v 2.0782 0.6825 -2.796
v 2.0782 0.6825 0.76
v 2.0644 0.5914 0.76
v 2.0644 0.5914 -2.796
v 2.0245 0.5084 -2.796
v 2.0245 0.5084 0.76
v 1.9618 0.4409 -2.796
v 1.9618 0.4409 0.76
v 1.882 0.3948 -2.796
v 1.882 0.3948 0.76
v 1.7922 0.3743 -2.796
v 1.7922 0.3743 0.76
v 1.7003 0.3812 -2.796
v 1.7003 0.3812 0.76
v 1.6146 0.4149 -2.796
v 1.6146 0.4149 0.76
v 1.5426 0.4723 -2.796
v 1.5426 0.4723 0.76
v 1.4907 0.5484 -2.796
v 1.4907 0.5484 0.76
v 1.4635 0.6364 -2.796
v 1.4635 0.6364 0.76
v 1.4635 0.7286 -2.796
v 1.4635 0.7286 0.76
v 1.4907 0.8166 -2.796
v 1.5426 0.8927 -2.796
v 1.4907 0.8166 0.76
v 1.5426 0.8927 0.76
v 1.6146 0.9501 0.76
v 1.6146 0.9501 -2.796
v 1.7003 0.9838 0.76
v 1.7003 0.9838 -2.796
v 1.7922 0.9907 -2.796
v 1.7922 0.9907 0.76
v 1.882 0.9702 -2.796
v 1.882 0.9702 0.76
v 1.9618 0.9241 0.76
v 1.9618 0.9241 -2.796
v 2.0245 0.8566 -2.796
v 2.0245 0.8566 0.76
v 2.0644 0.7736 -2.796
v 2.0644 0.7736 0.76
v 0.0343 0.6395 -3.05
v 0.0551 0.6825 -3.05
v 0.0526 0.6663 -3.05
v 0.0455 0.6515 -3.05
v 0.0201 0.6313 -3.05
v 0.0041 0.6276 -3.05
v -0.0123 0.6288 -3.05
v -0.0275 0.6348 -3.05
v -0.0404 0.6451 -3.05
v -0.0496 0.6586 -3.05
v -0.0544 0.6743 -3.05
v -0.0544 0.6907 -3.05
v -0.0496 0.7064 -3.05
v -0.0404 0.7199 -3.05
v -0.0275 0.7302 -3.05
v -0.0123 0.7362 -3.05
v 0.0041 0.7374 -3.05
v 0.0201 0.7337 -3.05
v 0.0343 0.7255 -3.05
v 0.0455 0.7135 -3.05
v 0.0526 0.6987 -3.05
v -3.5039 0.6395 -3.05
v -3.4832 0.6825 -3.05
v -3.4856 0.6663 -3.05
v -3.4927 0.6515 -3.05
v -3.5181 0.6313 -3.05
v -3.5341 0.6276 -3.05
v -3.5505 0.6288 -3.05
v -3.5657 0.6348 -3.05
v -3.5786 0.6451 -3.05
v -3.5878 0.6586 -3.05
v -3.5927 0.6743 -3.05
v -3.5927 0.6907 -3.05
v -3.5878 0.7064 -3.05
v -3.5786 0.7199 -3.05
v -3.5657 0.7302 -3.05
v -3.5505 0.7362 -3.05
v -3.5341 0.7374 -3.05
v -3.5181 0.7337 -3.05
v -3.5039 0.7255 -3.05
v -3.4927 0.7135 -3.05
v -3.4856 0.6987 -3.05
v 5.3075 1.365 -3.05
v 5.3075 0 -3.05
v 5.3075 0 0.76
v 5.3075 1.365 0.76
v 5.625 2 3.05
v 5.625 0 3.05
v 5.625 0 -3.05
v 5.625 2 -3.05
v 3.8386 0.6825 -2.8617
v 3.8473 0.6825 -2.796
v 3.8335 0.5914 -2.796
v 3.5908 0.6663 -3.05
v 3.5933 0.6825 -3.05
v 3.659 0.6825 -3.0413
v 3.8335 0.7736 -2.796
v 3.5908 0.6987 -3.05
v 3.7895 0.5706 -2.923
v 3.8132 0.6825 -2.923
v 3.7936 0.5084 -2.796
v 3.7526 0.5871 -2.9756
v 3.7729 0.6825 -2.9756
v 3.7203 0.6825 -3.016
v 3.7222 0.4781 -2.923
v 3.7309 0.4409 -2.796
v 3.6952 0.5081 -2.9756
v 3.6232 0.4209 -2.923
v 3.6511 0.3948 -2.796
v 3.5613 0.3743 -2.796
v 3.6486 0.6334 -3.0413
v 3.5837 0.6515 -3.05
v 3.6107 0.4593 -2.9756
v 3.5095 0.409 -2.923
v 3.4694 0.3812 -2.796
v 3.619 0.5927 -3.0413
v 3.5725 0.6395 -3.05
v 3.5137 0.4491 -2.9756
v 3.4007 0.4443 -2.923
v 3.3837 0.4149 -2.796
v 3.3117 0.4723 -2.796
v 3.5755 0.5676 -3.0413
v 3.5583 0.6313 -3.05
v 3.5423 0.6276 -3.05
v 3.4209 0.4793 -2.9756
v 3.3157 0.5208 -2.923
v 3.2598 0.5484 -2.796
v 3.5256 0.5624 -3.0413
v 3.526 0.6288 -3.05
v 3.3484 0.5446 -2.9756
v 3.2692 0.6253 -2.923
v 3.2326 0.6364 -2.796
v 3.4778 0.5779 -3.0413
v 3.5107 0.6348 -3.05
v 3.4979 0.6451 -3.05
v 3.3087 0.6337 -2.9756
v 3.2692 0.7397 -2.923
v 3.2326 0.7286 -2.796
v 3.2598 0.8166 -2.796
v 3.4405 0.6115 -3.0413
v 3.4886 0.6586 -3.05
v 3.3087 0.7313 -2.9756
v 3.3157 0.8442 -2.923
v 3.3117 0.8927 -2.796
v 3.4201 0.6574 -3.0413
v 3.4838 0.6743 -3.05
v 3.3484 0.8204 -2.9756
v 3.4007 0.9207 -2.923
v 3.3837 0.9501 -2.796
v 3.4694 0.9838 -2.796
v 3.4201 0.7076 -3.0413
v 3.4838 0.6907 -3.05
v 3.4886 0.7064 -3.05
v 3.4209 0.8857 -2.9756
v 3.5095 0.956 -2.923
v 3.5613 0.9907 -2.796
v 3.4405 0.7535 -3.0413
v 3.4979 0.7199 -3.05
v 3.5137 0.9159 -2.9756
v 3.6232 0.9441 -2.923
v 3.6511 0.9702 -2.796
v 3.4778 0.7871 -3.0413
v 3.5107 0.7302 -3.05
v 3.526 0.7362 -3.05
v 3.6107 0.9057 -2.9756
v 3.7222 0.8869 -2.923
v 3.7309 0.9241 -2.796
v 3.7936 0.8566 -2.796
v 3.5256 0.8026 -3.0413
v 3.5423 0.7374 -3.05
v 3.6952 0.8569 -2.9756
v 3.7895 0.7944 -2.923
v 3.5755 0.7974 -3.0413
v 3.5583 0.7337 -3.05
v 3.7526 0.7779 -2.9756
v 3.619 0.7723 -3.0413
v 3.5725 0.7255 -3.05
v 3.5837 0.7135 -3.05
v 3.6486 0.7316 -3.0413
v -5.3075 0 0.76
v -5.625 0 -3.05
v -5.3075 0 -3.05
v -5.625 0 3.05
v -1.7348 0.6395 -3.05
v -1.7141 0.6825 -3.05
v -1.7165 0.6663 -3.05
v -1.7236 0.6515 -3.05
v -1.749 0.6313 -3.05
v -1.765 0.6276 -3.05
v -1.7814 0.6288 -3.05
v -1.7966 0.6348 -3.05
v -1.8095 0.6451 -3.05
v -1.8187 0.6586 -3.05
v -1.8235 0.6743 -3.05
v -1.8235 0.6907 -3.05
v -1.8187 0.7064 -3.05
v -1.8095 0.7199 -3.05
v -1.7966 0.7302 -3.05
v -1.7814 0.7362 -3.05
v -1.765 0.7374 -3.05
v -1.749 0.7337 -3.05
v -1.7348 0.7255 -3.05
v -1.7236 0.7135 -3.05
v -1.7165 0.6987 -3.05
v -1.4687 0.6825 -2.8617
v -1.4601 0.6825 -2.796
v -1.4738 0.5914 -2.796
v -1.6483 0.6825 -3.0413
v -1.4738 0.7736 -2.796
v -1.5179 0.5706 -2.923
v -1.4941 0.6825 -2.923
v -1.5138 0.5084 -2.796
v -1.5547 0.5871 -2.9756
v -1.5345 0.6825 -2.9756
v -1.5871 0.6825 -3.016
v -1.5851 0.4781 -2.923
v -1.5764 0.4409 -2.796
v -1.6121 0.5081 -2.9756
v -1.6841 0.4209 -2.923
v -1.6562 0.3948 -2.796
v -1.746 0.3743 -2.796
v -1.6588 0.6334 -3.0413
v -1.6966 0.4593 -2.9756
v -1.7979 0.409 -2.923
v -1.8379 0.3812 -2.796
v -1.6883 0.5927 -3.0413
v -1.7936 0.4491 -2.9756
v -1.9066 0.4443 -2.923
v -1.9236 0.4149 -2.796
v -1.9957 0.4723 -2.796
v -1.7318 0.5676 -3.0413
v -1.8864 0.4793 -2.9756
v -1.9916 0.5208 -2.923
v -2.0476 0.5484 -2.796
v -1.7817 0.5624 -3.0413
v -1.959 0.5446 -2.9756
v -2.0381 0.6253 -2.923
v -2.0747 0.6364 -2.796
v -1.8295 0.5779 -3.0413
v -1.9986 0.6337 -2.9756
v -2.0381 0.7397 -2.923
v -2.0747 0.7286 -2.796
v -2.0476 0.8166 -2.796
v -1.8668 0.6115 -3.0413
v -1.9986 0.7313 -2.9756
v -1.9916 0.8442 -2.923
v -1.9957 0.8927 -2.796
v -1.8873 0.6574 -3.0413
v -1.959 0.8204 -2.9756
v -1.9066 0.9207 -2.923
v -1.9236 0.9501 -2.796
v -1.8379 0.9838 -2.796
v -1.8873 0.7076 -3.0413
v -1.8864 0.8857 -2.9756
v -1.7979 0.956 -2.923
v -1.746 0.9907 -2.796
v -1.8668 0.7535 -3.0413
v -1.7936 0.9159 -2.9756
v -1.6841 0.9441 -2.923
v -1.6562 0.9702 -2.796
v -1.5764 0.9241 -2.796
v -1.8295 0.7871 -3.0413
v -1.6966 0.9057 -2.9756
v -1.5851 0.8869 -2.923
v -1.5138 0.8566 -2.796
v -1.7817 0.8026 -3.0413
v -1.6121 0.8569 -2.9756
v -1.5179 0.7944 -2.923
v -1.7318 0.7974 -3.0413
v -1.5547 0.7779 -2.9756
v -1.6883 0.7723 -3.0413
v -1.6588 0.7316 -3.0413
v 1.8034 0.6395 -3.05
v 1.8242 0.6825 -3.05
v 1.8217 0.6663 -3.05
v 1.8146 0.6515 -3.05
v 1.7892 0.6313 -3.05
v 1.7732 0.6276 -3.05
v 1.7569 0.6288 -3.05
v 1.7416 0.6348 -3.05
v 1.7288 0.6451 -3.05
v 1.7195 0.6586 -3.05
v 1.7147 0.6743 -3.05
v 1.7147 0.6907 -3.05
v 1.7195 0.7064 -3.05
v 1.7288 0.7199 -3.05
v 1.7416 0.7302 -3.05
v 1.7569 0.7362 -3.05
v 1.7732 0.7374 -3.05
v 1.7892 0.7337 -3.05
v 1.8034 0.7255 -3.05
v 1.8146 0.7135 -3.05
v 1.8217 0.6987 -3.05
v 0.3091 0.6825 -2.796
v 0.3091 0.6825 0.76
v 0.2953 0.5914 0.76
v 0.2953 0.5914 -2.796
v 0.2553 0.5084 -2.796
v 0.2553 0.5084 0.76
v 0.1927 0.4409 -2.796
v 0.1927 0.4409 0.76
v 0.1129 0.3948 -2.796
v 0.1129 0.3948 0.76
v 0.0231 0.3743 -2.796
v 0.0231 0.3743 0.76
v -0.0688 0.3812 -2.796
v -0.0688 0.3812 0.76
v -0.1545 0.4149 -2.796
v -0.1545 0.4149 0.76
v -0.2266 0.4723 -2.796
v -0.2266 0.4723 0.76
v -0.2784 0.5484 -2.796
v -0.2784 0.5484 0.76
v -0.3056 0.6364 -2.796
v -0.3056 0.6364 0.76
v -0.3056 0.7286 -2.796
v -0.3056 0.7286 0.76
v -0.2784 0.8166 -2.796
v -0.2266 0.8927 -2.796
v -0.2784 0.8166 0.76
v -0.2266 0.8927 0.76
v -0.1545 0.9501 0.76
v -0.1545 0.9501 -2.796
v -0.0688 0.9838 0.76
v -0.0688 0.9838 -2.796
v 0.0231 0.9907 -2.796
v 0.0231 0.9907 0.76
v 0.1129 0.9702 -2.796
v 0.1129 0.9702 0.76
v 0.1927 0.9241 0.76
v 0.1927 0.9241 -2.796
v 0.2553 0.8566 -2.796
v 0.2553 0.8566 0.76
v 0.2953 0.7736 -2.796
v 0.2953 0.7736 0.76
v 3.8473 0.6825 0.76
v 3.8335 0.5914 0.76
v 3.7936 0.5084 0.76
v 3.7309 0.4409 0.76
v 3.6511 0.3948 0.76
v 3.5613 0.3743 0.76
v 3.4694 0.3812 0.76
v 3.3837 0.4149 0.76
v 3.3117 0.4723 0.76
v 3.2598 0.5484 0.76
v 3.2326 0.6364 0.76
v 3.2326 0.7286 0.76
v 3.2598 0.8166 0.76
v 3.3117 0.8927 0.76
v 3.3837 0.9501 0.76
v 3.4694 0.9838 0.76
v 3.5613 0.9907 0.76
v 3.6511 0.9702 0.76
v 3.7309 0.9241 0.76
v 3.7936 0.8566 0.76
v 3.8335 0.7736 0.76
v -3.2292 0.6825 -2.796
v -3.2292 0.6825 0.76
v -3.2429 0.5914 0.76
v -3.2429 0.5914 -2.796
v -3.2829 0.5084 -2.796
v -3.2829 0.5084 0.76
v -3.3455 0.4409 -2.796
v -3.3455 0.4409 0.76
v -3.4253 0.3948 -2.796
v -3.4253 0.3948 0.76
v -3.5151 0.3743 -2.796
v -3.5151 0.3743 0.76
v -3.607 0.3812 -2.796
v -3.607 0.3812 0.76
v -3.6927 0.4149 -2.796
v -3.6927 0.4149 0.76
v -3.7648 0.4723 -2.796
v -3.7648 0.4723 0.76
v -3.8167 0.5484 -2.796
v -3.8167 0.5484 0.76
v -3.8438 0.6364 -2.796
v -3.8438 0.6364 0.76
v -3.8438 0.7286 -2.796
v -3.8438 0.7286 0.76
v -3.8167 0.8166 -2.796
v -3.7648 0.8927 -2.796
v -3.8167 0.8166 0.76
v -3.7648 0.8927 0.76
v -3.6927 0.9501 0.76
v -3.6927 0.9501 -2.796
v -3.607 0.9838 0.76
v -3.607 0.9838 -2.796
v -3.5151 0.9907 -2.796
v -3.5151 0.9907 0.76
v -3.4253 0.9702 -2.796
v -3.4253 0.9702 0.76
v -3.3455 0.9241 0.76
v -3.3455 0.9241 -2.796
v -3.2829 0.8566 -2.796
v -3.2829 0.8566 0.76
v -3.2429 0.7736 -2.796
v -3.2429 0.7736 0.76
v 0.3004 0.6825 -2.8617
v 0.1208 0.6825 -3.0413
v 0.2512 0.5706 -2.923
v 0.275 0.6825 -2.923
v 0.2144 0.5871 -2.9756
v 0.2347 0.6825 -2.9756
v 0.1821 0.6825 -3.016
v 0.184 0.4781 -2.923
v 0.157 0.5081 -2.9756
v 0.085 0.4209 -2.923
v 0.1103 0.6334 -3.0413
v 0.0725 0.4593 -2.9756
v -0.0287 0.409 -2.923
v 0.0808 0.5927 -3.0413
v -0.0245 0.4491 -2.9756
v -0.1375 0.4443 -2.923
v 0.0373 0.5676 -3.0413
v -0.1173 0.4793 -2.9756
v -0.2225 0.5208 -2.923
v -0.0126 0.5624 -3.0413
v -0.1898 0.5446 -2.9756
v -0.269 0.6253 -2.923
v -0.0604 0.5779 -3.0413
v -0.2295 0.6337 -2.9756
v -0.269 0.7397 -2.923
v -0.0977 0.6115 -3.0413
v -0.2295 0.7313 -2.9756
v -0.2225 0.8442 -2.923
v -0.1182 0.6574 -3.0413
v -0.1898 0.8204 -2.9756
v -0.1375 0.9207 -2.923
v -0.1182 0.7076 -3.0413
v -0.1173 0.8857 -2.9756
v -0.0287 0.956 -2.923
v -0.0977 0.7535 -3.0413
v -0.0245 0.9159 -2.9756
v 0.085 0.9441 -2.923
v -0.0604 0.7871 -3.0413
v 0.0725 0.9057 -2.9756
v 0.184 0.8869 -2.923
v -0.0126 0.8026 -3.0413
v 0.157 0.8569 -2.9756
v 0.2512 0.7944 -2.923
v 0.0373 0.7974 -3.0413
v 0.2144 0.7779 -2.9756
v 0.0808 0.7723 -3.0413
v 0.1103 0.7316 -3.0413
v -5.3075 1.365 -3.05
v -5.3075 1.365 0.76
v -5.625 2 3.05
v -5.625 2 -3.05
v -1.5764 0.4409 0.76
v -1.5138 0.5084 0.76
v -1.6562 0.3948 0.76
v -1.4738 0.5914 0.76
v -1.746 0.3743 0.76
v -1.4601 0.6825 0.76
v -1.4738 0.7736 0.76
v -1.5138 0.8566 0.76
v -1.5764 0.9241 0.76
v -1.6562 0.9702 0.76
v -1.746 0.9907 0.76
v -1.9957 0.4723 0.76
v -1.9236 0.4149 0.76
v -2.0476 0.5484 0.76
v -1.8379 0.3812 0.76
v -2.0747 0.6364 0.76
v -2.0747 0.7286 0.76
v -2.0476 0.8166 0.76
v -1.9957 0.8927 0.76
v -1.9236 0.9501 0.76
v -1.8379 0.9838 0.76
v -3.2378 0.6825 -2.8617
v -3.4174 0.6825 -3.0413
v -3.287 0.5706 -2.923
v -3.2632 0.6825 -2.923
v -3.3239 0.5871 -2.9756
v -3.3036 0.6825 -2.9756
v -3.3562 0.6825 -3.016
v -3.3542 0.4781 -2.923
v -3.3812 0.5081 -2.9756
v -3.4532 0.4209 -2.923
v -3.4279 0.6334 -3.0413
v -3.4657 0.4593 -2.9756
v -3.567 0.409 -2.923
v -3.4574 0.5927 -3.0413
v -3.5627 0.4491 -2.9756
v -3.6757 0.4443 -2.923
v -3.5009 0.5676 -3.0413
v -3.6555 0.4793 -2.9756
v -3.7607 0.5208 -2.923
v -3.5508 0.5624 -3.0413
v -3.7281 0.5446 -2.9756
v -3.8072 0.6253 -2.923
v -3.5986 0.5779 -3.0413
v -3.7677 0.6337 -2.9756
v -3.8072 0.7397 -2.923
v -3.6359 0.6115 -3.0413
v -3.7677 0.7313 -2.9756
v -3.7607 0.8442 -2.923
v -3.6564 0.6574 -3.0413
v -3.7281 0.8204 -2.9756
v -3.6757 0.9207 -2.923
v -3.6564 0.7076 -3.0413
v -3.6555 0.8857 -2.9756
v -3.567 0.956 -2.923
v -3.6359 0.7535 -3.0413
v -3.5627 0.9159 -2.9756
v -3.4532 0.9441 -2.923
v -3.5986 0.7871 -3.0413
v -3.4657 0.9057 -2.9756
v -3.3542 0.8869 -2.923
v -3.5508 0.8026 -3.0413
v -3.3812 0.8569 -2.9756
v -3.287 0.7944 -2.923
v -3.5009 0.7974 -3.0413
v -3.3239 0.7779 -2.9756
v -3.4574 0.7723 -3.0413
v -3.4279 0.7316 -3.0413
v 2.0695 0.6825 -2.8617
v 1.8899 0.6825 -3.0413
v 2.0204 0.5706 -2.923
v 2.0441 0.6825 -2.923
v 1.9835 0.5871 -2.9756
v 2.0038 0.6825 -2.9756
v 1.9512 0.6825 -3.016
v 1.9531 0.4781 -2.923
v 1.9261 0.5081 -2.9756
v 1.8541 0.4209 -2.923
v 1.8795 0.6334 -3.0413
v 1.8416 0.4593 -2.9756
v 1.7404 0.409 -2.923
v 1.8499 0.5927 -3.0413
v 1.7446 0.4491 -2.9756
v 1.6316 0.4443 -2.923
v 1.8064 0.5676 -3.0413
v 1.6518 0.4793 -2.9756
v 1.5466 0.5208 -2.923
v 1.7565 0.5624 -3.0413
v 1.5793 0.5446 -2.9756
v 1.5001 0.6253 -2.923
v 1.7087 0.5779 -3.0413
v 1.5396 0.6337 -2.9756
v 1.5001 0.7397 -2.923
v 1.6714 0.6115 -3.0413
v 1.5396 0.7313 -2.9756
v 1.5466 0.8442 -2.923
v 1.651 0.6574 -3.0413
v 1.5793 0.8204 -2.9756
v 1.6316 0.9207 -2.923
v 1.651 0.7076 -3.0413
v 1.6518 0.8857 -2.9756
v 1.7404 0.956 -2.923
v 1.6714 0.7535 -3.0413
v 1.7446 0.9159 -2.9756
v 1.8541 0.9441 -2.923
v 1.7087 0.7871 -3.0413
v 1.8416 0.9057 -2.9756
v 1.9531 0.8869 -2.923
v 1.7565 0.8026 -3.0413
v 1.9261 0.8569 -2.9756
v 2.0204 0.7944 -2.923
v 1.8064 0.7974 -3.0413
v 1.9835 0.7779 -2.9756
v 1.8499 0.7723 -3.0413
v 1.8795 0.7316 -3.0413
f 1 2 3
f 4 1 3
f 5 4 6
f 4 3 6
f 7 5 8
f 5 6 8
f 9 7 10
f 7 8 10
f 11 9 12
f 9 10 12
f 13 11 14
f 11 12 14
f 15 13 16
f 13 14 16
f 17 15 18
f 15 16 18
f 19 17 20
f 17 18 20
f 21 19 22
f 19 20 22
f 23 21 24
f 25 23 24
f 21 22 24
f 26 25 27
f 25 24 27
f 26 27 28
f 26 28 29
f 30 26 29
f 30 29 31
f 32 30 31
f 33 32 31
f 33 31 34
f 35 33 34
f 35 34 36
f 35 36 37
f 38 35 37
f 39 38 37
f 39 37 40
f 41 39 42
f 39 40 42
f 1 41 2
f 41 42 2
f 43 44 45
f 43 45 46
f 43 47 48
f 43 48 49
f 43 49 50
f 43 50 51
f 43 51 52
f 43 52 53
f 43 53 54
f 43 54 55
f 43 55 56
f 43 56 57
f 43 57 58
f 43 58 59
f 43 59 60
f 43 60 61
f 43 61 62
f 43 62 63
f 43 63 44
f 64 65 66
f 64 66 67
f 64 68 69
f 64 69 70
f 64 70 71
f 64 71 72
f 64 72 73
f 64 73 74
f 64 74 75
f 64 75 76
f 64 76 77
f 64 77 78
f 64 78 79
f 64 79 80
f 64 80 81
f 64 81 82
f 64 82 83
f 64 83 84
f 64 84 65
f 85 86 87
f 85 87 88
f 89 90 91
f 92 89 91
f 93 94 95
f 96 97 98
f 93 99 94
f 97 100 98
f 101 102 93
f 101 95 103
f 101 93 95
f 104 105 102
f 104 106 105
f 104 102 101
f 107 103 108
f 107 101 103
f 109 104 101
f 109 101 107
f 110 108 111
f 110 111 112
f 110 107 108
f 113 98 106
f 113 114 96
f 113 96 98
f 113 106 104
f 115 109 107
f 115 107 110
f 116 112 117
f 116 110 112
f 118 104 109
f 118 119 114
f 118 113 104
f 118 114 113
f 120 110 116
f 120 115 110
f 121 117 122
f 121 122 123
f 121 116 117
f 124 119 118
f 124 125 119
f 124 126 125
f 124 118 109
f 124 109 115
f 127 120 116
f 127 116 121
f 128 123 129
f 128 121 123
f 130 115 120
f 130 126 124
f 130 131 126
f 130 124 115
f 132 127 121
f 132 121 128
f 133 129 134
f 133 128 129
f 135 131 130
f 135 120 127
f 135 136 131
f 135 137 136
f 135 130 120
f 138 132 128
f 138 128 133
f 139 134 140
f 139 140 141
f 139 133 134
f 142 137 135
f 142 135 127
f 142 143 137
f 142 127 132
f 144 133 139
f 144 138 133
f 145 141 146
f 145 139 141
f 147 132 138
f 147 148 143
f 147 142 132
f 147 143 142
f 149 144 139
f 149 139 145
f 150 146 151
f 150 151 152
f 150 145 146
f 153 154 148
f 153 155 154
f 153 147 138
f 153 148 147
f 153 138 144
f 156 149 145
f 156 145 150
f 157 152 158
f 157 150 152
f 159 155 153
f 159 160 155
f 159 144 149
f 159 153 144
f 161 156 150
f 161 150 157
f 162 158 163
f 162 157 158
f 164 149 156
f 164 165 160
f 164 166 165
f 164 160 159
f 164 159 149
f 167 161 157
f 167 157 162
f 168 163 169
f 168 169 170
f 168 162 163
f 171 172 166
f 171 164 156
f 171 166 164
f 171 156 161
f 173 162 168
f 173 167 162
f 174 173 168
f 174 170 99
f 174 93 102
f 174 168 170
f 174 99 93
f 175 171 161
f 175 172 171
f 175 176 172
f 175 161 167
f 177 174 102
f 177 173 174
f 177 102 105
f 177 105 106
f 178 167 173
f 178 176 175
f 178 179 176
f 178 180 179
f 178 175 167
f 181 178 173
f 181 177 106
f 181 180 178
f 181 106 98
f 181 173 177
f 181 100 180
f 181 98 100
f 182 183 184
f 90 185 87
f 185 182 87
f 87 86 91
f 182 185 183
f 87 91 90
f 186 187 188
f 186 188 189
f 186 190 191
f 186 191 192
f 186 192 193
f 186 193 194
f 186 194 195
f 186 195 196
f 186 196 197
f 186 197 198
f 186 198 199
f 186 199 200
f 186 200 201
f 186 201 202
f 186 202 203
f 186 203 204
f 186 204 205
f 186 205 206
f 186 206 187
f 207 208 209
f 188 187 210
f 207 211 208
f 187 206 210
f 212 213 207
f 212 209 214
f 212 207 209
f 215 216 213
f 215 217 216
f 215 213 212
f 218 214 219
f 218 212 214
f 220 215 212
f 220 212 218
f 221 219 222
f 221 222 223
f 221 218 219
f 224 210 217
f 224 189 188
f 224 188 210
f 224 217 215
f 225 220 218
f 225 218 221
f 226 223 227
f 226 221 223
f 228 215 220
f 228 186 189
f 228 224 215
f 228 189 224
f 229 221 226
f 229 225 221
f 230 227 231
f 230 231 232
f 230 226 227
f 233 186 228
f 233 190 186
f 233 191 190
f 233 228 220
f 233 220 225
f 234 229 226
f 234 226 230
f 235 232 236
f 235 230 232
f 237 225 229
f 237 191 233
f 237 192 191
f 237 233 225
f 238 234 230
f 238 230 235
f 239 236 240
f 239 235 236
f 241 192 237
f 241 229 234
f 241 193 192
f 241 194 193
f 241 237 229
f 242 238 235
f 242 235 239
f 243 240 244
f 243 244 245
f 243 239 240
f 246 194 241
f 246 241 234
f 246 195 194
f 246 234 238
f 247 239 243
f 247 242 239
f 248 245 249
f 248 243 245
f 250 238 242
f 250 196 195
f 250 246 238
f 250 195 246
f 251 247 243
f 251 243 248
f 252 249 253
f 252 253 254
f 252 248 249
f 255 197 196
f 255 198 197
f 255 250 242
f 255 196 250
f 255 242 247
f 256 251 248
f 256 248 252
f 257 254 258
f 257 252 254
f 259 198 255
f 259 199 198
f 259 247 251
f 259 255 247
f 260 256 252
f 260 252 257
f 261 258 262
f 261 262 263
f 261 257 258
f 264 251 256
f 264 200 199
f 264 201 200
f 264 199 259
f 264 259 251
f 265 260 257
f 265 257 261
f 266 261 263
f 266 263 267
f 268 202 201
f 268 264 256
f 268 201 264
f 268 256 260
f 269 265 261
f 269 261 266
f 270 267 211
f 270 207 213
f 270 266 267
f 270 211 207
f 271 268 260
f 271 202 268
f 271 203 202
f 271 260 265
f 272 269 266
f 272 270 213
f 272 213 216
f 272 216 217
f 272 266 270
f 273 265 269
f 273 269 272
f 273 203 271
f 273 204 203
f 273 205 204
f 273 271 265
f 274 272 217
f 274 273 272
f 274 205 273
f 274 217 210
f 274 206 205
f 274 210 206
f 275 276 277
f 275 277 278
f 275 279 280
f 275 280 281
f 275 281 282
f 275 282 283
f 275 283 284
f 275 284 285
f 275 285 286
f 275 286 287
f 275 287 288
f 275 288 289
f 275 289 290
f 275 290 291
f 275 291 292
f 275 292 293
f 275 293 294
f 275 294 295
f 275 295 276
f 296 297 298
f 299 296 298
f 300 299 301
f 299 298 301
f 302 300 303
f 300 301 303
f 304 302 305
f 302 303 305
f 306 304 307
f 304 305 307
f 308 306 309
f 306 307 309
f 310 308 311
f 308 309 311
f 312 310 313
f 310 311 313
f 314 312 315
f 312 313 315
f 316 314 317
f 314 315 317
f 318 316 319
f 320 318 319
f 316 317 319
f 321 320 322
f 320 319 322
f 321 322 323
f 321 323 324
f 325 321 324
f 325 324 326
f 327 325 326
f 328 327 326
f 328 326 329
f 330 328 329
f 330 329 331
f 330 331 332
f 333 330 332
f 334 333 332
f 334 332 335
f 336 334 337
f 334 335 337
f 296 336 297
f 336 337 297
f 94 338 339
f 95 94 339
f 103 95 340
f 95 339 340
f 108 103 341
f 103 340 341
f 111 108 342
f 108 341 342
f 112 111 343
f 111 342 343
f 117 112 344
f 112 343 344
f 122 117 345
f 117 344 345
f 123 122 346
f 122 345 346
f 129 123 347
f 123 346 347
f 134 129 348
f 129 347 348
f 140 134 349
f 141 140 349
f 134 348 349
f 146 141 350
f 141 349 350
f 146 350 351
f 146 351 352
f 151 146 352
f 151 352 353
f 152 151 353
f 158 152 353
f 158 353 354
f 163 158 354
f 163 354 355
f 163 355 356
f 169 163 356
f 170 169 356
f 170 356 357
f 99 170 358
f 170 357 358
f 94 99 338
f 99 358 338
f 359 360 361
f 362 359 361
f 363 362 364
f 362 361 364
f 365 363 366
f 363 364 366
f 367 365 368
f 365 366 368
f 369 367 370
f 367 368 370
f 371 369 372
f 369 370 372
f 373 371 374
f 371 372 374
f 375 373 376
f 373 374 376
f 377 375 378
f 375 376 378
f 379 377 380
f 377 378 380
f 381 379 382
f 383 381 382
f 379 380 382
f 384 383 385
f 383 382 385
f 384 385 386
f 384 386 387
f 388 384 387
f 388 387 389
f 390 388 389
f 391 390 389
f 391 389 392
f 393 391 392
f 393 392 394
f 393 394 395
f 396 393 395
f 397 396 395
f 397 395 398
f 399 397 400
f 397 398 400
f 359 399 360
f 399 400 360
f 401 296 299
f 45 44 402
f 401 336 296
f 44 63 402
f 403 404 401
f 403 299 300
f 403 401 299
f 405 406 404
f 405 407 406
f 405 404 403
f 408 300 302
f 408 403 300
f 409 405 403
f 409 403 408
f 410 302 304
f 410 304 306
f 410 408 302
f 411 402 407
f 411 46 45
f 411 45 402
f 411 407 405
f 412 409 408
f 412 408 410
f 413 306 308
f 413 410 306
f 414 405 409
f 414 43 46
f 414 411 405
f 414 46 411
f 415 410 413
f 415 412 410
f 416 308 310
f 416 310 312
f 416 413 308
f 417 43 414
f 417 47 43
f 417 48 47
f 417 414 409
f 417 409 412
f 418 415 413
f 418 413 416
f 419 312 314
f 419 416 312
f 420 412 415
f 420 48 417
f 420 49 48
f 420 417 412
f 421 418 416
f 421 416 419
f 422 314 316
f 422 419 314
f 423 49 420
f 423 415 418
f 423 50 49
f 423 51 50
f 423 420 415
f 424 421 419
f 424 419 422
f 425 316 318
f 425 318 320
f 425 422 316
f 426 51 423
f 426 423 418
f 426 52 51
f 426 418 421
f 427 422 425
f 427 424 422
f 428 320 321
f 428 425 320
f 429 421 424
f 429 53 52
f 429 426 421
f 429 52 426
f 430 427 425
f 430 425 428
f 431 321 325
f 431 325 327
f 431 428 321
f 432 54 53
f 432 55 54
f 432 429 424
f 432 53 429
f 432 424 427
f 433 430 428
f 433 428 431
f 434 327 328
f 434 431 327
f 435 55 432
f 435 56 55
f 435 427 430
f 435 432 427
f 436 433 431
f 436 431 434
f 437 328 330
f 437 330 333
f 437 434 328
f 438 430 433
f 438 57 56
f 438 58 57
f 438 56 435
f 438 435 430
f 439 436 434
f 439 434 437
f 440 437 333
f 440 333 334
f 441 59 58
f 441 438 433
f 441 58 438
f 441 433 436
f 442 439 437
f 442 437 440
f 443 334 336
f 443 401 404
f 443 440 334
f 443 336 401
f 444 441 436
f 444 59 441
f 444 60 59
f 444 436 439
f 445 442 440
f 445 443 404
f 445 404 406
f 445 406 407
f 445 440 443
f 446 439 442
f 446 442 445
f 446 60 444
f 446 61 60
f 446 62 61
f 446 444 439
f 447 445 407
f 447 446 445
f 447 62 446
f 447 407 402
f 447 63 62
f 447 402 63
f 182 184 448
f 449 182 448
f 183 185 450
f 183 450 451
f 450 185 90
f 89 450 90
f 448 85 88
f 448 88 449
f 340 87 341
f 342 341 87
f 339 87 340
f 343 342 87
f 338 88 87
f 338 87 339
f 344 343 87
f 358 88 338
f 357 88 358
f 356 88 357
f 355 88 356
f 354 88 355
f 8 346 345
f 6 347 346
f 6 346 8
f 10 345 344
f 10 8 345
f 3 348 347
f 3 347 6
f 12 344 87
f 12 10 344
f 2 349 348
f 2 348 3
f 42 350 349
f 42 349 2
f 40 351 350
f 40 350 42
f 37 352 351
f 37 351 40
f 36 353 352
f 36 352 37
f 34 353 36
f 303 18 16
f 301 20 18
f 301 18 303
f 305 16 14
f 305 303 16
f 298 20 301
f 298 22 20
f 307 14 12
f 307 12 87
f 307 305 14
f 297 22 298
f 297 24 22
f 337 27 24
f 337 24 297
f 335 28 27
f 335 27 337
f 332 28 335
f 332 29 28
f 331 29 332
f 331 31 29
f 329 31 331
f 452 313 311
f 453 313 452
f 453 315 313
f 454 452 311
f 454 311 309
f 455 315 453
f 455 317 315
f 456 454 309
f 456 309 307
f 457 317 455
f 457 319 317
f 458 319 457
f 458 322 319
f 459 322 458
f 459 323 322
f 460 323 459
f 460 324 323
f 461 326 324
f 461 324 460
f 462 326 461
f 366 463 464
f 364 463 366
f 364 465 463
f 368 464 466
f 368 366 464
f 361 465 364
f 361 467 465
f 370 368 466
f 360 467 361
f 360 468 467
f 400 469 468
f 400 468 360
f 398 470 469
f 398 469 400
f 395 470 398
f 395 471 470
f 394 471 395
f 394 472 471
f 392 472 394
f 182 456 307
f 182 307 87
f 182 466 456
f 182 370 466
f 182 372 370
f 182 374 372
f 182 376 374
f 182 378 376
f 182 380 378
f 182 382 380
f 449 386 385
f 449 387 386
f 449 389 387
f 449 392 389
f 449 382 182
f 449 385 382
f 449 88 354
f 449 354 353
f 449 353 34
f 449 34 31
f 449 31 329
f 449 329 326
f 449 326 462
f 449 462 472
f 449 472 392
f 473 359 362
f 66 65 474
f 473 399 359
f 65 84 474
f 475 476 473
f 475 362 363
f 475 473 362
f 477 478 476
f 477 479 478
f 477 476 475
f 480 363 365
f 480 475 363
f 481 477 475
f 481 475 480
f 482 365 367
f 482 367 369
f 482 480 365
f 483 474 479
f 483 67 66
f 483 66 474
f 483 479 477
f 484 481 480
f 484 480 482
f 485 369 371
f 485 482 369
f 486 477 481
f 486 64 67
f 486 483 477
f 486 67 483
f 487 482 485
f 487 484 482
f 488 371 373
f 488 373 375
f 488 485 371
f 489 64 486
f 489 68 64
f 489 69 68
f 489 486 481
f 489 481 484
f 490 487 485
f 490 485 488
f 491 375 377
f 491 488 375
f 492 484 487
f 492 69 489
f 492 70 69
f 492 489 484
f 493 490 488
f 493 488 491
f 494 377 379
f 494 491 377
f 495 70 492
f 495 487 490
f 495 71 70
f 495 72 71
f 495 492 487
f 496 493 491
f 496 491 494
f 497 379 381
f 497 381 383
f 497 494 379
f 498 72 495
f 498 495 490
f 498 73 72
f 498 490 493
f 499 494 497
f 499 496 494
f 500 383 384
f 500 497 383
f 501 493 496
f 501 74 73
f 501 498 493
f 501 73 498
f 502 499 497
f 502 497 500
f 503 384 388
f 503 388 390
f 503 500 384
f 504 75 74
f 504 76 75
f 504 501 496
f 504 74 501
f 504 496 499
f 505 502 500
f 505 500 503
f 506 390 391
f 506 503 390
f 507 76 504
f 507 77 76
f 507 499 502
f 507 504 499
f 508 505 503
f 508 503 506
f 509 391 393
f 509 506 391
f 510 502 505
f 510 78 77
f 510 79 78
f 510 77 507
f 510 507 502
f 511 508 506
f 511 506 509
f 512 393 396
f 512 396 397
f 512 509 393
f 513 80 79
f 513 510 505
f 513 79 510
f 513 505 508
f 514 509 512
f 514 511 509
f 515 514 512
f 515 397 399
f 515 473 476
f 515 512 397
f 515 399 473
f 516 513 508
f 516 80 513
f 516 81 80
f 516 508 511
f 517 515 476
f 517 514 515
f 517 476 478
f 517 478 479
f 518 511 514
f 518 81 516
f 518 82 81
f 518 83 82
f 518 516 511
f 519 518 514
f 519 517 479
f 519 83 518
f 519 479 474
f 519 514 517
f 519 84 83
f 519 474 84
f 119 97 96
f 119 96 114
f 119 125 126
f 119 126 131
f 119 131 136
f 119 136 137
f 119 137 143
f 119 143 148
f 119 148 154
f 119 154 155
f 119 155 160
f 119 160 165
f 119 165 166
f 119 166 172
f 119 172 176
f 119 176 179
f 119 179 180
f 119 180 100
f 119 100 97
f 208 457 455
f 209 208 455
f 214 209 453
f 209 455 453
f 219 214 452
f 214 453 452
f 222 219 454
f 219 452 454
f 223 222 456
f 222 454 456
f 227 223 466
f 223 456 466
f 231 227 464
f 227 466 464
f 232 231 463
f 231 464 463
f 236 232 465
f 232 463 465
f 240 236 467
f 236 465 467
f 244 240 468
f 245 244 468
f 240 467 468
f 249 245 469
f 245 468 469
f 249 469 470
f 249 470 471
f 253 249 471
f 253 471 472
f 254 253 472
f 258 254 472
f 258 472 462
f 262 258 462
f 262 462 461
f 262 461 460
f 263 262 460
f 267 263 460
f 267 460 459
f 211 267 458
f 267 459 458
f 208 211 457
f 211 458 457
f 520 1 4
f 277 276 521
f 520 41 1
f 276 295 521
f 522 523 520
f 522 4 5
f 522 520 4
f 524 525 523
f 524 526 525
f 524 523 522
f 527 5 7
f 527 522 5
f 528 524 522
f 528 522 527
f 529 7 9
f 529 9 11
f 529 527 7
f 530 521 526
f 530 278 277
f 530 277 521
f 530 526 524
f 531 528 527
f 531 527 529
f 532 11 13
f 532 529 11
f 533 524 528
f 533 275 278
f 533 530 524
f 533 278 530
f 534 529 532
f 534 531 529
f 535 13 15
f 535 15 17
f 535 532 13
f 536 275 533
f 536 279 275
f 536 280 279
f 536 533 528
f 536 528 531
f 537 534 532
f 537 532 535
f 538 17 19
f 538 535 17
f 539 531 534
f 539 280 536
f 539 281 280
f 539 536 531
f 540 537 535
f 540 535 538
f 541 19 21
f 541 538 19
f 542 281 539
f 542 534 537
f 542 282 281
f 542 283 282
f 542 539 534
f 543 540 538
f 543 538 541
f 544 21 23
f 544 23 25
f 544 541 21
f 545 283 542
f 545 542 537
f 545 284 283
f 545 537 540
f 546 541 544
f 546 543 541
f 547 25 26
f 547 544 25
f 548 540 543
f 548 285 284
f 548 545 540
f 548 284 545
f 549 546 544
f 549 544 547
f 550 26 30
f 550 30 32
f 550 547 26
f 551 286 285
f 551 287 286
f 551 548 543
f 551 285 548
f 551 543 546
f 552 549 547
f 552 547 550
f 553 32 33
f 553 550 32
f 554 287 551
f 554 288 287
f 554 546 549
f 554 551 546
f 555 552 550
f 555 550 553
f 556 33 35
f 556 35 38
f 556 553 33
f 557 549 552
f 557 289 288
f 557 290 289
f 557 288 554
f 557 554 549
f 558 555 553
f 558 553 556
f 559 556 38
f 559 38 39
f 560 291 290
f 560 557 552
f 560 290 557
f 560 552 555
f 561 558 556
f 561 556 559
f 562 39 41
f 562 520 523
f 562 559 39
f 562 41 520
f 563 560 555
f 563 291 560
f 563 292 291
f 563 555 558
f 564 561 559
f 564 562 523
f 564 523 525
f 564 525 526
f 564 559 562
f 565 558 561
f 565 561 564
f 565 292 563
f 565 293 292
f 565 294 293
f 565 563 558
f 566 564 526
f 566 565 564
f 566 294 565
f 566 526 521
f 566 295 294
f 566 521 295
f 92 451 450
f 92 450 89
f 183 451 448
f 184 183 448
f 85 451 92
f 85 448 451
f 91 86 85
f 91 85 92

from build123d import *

# Parameters (mm, degrees)
SKETCH1_W           = 11.25
SKETCH1_H           = 6.1
BOSS_EXTRUDE1_DEPTH = 2
SKETCH2_W           = 10.615
SKETCH2_H           = 2.73
CUT_EXTRUDE1_DEPTH  = 3.81
SKETCH4_R           = 0.309051048
BOSS_EXTRUDE2_DEPTH = 3.81
FILLET1_R           = 0.254


with BuildPart() as part:
    # Sketch1 → Boss-Extrude1 (new body)
    with BuildSketch(Plane(origin=(0, 0, 0), x_dir=(1, 0, 0), z_dir=(0, 1, 0))):
        Rectangle(SKETCH1_W, SKETCH1_H)
    extrude(amount=BOSS_EXTRUDE1_DEPTH)

    # Sketch2 → Cut-Extrude1 (cut)
    with BuildSketch(Plane(origin=(0, 0, -3.05), x_dir=(-1, 0, 0), z_dir=(0, 0, -1))):
        Rectangle(SKETCH2_W, SKETCH2_H)
    extrude(amount=-CUT_EXTRUDE1_DEPTH, mode=Mode.SUBTRACT)

    # Sketch4 → Boss-Extrude2 (add)
    with BuildSketch(Plane(origin=(0, 0, 0.76), x_dir=(-1, 0, 0), z_dir=(0, 0, -1))):
        with Locations(Location((-3.53822, 0.6825, 0), (0, 0, 180))):
            Circle(SKETCH4_R)
        with Locations(Location((-1.76911, 0.6825, 0), (0, 0, 180))):
            Circle(SKETCH4_R)
        with Locations(Location((0, 0.6825, 0), (0, 0, 180))):
            Circle(SKETCH4_R)
        with Locations(Location((1.76911, 0.6825, 0), (0, 0, 180))):
            Circle(SKETCH4_R)
        with Locations(Location((3.53822, 0.6825, 0), (0, 0, 180))):
            Circle(SKETCH4_R)
    extrude(amount=BOSS_EXTRUDE2_DEPTH)

    # Fillet1
    fillet1_edges = [part.edges().sort_by_distance(p)[0] for p in [
        (3.229168952, 0.6825, -3.05),
        (1.460058952, 0.6825, -3.05),
        (-0.309051048, 0.6825, -3.05),
        (-2.078161048, 0.6825, -3.05),
        (-3.847271048, 0.6825, -3.05),
    ]]
    fillet(fillet1_edges, radius=FILLET1_R)


solid = part.part
